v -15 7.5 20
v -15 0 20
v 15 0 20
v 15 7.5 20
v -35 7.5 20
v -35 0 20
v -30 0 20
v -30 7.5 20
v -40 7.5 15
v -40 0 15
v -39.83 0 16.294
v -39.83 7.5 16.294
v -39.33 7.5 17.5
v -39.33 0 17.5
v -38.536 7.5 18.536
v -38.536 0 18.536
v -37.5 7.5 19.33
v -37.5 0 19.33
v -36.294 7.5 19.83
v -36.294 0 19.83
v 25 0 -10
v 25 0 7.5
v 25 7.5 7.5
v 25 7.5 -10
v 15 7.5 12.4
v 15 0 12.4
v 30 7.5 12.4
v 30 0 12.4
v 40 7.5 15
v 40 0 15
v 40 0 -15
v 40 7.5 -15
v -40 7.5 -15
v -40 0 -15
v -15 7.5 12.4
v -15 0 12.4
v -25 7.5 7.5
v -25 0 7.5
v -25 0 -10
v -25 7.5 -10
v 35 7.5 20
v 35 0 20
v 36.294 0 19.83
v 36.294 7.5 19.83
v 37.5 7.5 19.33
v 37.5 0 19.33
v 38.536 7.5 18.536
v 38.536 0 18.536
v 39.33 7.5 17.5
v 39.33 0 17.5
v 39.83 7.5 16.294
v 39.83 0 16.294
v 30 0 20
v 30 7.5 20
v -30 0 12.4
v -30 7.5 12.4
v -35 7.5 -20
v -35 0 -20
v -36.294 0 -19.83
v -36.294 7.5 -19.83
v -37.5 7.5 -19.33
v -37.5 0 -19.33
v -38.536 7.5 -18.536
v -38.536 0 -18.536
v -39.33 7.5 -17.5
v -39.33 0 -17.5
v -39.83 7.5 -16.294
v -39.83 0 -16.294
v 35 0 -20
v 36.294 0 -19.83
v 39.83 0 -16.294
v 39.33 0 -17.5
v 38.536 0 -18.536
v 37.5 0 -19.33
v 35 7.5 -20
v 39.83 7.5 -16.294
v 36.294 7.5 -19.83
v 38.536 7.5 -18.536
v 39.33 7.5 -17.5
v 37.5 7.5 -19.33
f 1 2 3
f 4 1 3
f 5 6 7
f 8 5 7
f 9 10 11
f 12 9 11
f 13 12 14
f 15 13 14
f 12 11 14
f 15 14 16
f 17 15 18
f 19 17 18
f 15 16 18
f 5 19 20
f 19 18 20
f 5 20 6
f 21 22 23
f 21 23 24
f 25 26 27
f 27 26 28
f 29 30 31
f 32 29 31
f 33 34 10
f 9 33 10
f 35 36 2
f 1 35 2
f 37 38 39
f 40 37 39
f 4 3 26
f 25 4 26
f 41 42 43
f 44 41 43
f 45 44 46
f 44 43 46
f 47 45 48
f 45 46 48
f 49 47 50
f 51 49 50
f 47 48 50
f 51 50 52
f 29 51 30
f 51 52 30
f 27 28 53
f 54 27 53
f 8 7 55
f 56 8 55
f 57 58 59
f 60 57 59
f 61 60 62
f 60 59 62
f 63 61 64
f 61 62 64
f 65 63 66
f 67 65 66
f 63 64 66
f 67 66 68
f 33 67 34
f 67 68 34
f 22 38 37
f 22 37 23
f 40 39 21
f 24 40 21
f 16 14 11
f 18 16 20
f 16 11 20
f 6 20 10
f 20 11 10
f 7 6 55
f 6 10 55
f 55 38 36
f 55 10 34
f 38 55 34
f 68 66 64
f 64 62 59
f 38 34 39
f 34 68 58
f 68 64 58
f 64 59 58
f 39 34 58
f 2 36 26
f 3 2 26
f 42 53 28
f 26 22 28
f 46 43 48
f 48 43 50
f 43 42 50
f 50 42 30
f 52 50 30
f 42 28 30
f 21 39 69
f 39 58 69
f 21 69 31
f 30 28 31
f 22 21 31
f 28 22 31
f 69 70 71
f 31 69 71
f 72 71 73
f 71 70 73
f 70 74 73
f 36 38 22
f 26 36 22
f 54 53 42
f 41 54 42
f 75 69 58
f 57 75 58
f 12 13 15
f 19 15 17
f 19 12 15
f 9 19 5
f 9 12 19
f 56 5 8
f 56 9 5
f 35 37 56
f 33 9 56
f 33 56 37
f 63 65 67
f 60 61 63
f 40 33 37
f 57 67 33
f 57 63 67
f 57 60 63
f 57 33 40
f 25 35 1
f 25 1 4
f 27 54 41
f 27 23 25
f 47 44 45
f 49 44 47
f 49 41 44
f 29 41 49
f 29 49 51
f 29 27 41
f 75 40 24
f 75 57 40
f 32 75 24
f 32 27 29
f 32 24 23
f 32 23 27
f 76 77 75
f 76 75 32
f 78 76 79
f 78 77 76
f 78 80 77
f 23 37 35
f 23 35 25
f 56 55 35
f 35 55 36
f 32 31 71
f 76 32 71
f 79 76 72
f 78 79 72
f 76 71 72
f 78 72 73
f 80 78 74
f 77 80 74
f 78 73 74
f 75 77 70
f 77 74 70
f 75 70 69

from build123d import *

# Parameters (mm, degrees)
SKETCH1_W           = 50
SKETCH1_H           = 17.5
BOSS_EXTRUDE1_DEPTH = 7.5


with BuildPart() as part:
    # Sketch1 → Boss-Extrude1 (new body)
    with BuildSketch(Plane(origin=(0, 0, 0), x_dir=(1, 0, 0), z_dir=(0, 1, 0))):
        with BuildLine():
            Line((15, -20), (15, -12.4))
            Line((15, -12.4), (30, -12.4))
            Line((30, -12.4), (30, -20))
            Line((30, -20), (35, -20))
            ThreePointArc((35, -20), (38.535533906, -18.535533906), (40, -15))
            Line((40, -15), (40, 15))
            ThreePointArc((40, 15), (38.535533906, 18.535533906), (35, 20))
            Line((35, 20), (-35, 20))
            ThreePointArc((-35, 20), (-38.535533906, 18.535533906), (-40, 15))
            Line((-40, 15), (-40, -15))
            ThreePointArc((-40, -15), (-38.535533906, -18.535533906), (-35, -20))
            Line((-35, -20), (-30, -20))
            Line((-30, -20), (-30, -12.4))
            Line((-30, -12.4), (-15, -12.4))
            Line((-15, -12.4), (-15, -20))
            Line((-15, -20), (15, -20))
        make_face()
        with Locations((0, 1.25)):
            Rectangle(SKETCH1_W, SKETCH1_H, mode=Mode.SUBTRACT)
    extrude(amount=BOSS_EXTRUDE1_DEPTH)


solid = part.part
